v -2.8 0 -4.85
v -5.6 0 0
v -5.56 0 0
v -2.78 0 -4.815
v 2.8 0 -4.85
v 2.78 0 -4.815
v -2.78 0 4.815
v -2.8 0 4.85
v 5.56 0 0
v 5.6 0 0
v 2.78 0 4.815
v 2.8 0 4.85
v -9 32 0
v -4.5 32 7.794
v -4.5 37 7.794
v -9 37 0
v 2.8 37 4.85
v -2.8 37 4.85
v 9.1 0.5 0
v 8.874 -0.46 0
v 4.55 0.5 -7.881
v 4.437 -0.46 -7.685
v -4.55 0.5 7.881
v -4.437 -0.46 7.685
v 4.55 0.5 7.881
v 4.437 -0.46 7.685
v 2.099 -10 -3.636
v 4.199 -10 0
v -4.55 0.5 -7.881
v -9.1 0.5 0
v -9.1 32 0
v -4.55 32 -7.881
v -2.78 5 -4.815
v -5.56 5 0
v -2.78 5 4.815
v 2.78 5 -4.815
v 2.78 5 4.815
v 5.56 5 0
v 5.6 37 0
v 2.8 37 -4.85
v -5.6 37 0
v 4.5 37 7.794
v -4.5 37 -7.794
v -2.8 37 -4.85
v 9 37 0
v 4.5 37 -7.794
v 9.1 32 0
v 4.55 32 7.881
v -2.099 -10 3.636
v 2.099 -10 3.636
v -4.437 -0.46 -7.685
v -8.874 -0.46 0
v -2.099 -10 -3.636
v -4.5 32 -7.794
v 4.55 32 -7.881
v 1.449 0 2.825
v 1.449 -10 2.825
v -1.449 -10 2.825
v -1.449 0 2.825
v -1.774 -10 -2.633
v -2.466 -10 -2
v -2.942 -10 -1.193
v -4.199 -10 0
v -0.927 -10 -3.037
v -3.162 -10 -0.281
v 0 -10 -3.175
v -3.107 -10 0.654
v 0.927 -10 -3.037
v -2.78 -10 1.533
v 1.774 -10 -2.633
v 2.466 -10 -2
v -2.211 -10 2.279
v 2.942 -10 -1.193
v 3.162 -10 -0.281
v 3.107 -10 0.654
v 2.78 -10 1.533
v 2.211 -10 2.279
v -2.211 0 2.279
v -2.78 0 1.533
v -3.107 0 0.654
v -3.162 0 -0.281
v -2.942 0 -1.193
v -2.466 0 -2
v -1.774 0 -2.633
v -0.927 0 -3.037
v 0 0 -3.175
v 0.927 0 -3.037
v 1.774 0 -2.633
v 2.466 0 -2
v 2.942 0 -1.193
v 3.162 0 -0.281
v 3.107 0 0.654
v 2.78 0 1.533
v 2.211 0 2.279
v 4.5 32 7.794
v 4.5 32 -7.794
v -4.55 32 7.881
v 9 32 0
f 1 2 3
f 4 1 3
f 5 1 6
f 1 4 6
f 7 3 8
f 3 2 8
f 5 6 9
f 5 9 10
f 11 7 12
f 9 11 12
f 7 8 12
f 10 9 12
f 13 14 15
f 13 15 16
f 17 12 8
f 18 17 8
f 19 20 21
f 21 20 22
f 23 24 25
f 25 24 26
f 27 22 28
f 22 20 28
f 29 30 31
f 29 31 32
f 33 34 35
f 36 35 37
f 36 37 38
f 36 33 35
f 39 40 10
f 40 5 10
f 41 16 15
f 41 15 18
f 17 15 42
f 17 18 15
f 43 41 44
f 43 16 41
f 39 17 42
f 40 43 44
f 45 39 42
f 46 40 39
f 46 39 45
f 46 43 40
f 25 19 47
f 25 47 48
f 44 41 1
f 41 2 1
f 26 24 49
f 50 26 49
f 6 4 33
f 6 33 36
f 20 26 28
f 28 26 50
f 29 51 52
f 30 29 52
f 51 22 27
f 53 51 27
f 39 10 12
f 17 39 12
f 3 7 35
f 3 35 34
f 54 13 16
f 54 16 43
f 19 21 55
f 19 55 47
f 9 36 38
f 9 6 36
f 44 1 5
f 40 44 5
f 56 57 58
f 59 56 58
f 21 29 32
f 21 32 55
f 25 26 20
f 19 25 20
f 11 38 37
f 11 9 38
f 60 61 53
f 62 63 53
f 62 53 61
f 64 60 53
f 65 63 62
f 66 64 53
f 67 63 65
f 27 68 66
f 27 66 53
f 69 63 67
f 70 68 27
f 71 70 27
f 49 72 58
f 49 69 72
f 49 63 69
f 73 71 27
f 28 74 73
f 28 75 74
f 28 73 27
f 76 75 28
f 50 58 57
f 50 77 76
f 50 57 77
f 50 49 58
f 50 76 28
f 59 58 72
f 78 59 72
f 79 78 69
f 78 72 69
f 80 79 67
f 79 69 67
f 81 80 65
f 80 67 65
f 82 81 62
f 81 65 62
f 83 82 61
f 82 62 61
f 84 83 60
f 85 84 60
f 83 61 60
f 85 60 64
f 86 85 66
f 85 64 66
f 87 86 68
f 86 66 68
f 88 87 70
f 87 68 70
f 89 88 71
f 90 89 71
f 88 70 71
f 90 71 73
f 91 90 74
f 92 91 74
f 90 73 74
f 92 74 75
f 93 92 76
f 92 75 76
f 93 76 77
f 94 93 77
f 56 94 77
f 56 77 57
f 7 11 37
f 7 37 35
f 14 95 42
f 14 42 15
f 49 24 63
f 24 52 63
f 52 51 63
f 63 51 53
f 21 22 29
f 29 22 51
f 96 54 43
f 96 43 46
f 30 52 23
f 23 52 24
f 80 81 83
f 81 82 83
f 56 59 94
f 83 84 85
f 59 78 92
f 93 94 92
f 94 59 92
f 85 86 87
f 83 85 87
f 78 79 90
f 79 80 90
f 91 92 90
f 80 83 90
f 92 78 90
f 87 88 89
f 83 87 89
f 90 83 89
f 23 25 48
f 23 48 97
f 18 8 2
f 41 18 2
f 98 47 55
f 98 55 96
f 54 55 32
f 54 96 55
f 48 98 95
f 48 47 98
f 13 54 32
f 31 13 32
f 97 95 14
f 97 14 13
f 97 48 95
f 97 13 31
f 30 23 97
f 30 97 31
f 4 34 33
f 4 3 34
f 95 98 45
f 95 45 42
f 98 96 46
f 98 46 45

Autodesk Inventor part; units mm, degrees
ref_plane "YZ Plane" through (0, 0, 0) normal (1, 0, 0) x (0, 1, 0)
ref_plane "XZ Plane" through (0, 0, 0) normal (0, 1, 0) x (-1, 0, 0)
ref_plane "XY Plane" through (0, 0, 0) normal (0, 0, 1) x (1, 0, 0)
sketch "Boceto11" plane through (0, 0, 0) normal (0, 1, 0) x (-1, 0, 0)
  line L0 (0, 0) -> (5.6, 0)
  line L1 (5.6, 0) -> (2.8, -4.8497)
  line L2 (2.8, -4.8497) -> (-2.8, -4.8497)
  line L3 (-2.8, -4.8497) -> (-5.6, 0)
  line L4 (-5.6, 0) -> (-2.8, 4.8497)
  line L5 (-2.8, 4.8497) -> (2.8, 4.8497)
  line L6 (2.8, 4.8497) -> (5.6, 0)
  line L7 (5.6, 0) -> (9.1, 0)
  line L8 (9.1, 0) -> (4.55, -7.8808)
  line L9 (4.55, -7.8808) -> (-4.55, -7.8808)
  line L10 (-4.55, -7.8808) -> (-9.1, 0)
  line L11 (-9.1, 0) -> (-4.55, 7.8808)
  line L12 (-4.55, 7.8808) -> (4.55, 7.8808)
  line L13 (4.55, 7.8808) -> (9.1, 0)
  dimension "d42" = 5.6
  dimension "d43" = 3.5
extrude "Extrusión10" add sketch "Boceto11" along normal blind 32
sketch "Boceto16" plane through (0, 0, 0) normal (0, -1, 0) x (1, 0, 0)
  line L0 (4.55, 7.8808) -> (9.1, 0) projected
  line L1 (9.1, 0) -> (4.55, -7.8808)
  line L2 (4.55, -7.8808) -> (-4.55, -7.8808)
  line L3 (-4.55, -7.8808) -> (-9.1, 0)
  line L4 (-9.1, 0) -> (-4.55, 7.8808)
  line L5 (-4.55, 7.8808) -> (4.55, 7.8808)
  line L6 (4.55, 7.8808) -> (9.1, 0)
  point P0 (0, 0)
  point P1 (0, 0)
extrude "Extrusión14" add sketch "Boceto16" along normal blind 10 draft -23
sketch "Boceto19" plane through (0, -10, 0) normal (0, -1, 0) x (1, 0, 0)
  line L0 (-2.0993, 3.6361) -> (2.0993, 3.6361) projected
  line L1 (2.0993, -3.6361) -> (-2.0993, -3.6361) projected
  line L2 (2.0993, 3.6361) -> (4.1986, 0) projected
  line L3 (-4.55, -7.8808) -> (-2.0993, -3.6361) projected
  line L4 (-4.1986, 0) -> (-2.0993, 3.6361) projected
  arc A0 (-1.4491, 2.825) -> (1.4491, 2.825) centre (0, 0) ccw
  line L5 (0, 2.825) -> (-1.4491, 2.825)
  line L6 (0, 2.825) -> (1.4491, 2.825)
extrude "Extrusión16" cut sketch "Boceto19" against normal blind 15
sketch "Boceto20" plane through (0, 0, 0) normal (0, 1, 0) x (1, 0, 0)
  line L0 (-4.55, -7.8808) -> (-2.0993, -3.6361) projected
  line L1 (-2.7798, -4.8148) -> (-5.5597, 0)
  line L2 (-5.5597, 0) -> (-2.7798, 4.8148)
  line L3 (-2.7798, 4.8148) -> (2.7798, 4.8148)
  line L4 (2.7798, 4.8148) -> (5.5597, 0)
  line L5 (5.5597, 0) -> (2.7798, -4.8148)
  line L6 (2.7798, -4.8148) -> (-2.7798, -4.8148)
  point P0 (0, 0)
  point P1 (0, 0)
extrude "Extrusión17" add sketch "Boceto20" along normal blind 5
sketch "Boceto21" plane through (0, 32, 0) normal (0, 1, 0) x (1, 0, 0)
  line L0 (-2.8, -4.8497) -> (-5.6, 0) projected
  line L1 (-5.6, 0) -> (-2.8, 4.8497)
  line L2 (-2.8, 4.8497) -> (2.8, 4.8497)
  line L3 (2.8, 4.8497) -> (5.6, 0)
  line L4 (5.6, 0) -> (2.8, -4.8497)
  line L5 (2.8, -4.8497) -> (-2.8, -4.8497)
  line L6 (-2.8, -4.8497) -> (-5.6, 0)
  line L7 (-9, 0) -> (-4.5, 7.7942)
  line L8 (-4.5, 7.7942) -> (4.5, 7.7942)
  line L9 (4.5, 7.7942) -> (9, 0)
  line L10 (9, 0) -> (4.5, -7.7942)
  line L11 (4.5, -7.7942) -> (-4.5, -7.7942)
  line L12 (-4.5, -7.7942) -> (-9, 0)
  point P0 (0, 0)
  point P1 (0, 0)
  point P2 (0, 0)
extrude "Extrusión18" add sketch "Boceto21" along normal blind 5
chamfer "Chaflán1" distance 0.5 angle 45 6 edges at (0, 0, -7.8808) (-6.825, 0, -3.9404) (6.825, 0, -3.9404) (-6.825, 0, 3.9404) (0, 0, 7.8808) (6.825, 0, 3.9404)
properties part number "Bobinatge - acoplament eix"
